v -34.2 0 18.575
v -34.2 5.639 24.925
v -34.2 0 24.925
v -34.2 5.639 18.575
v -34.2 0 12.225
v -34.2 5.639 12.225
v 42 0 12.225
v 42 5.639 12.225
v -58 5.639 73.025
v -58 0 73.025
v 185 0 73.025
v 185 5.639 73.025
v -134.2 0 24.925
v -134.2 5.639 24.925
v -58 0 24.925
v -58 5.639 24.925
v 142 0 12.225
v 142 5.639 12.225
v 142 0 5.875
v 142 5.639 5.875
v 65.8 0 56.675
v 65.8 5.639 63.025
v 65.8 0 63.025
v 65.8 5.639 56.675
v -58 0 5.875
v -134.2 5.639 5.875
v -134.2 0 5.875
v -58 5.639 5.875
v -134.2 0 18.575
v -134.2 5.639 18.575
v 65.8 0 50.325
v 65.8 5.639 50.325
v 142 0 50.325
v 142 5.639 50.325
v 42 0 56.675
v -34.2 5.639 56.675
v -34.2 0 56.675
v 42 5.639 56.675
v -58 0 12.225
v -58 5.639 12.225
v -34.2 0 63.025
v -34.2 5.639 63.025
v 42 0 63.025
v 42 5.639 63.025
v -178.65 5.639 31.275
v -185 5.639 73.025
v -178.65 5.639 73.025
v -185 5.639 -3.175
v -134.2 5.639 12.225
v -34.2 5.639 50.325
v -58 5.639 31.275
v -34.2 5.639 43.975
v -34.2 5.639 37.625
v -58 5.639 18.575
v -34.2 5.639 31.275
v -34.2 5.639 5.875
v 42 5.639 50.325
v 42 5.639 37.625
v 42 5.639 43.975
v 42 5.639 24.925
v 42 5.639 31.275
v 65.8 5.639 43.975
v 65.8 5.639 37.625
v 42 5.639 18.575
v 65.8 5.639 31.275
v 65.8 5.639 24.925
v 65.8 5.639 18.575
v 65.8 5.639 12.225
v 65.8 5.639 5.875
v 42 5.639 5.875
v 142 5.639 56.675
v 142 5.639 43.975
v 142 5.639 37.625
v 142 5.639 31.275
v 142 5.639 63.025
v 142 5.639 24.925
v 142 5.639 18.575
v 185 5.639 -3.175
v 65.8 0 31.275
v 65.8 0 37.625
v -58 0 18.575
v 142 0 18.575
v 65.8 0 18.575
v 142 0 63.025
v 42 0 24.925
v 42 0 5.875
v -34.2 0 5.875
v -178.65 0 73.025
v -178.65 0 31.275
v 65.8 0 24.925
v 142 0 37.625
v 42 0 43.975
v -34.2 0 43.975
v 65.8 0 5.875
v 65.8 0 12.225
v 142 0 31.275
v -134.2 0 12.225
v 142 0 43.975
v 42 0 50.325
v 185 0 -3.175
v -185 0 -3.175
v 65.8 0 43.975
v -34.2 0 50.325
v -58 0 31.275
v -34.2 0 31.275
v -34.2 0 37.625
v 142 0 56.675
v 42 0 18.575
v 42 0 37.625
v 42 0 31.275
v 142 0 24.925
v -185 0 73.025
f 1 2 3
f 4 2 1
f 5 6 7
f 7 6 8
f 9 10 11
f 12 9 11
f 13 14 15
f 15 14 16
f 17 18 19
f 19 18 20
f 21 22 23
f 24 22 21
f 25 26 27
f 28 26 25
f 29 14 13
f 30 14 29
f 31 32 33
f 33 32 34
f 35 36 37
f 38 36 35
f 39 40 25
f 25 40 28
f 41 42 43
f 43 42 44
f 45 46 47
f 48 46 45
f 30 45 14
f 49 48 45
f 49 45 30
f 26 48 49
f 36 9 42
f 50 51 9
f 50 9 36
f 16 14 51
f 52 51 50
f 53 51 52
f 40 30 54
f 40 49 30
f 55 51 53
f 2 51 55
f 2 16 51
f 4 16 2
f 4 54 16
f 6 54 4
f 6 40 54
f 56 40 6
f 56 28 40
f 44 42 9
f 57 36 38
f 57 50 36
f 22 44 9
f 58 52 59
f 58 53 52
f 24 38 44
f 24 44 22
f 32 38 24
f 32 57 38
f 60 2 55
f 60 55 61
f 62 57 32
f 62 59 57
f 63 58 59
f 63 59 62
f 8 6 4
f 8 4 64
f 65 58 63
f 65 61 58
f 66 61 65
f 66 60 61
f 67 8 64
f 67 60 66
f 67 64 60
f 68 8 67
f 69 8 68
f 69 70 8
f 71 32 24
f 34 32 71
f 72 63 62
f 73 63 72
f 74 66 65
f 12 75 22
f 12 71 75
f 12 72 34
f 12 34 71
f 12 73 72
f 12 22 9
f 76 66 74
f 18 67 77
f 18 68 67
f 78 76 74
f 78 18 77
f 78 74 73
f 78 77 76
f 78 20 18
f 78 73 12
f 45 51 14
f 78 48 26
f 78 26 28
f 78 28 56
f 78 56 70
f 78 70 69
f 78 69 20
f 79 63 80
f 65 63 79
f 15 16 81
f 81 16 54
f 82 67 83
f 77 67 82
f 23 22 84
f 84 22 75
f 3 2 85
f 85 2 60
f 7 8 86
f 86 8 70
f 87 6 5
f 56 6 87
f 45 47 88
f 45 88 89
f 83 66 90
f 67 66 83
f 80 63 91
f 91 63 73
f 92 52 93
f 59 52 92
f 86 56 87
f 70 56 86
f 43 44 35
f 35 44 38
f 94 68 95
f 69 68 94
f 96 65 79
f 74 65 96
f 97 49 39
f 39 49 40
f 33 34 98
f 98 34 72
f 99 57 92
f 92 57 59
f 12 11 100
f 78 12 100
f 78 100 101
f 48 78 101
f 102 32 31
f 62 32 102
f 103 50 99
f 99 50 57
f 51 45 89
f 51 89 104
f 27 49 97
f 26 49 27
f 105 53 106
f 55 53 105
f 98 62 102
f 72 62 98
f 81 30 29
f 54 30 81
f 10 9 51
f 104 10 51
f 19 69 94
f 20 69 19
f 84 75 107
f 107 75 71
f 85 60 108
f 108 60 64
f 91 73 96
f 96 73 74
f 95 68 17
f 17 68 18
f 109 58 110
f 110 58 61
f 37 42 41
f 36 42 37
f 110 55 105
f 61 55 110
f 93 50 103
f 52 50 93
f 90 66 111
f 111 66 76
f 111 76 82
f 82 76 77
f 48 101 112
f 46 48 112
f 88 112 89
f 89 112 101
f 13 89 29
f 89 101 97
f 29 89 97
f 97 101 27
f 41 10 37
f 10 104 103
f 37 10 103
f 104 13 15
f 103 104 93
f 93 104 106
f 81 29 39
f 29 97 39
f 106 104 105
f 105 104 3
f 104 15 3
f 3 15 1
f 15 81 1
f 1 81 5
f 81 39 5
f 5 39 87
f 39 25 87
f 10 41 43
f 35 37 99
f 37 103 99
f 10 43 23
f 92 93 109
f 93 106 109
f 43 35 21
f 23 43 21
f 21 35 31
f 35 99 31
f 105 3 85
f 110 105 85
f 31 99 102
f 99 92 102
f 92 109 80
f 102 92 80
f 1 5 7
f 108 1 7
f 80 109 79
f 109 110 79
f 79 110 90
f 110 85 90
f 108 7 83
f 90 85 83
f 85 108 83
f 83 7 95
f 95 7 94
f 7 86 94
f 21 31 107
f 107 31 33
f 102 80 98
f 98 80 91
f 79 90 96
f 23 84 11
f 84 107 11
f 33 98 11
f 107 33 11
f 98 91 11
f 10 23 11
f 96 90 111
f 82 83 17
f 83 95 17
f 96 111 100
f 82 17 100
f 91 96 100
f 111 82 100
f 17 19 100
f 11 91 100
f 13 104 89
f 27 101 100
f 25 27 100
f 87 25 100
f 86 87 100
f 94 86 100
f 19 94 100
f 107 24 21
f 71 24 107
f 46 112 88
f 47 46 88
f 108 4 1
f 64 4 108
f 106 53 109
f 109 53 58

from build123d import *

# Parameters (mm, degrees)
BOSS_EXTRUDE1_DEPTH  = 5.6388
SKETCH2_W            = 76.2
SKETCH2_H            = 6.35
CUT_EXTRUDE1_DEPTH   = 6.6388
LPATTERN1_COUNT      = 5
LPATTERN1_PITCH      = 12.7
LPATTERN1_COUNT_DIR2 = 3
LPATTERN1_PITCH_DIR2 = 100
SKETCH3_W            = 120.65
SKETCH3_H            = 41.75
CUT_EXTRUDE2_DEPTH   = 6.6388


with BuildPart() as part:
    # Sketch1 → Boss-Extrude1 (new body)
    with BuildSketch(Plane(origin=(0, 0, 0), x_dir=(1, 0, 0), z_dir=(0, 1, 0))):
        Polygon((-185, -73.025), (185, -73.025), (185, -6.825), (185, 3.175), (175, 3.175), (-175, 3.175), (-185, 3.175), (-185, -6.825), align=None)
    extrude(amount=BOSS_EXTRUDE1_DEPTH)

    # Sketch2 → Cut-Extrude1 (cut, through all)
    with BuildSketch(Plane(origin=(0, 5.6388, 0), x_dir=(1, 0, 0), z_dir=(0, 1, 0))):
        with Locations((-96.1, -59.85)):
            Rectangle(SKETCH2_W, SKETCH2_H)
    cut_extrude1 = extrude(amount=-CUT_EXTRUDE1_DEPTH, mode=Mode.SUBTRACT)

    # LPattern1: Cut-Extrude1 5 × 3
    with Locations(*[(j * LPATTERN1_PITCH_DIR2, 0, -i * LPATTERN1_PITCH) for i in range(LPATTERN1_COUNT) for j in range(LPATTERN1_COUNT_DIR2) if (i, j) != (0, 0)]):
        add(cut_extrude1, mode=Mode.SUBTRACT)

    # Sketch3 → Cut-Extrude2 (cut, through all)
    with BuildSketch(Plane(origin=(0, 5.6388, 0), x_dir=(1, 0, 0), z_dir=(0, 1, 0))):
        with Locations((-118.325, -52.15)):
            Rectangle(SKETCH3_W, SKETCH3_H)
    extrude(amount=-CUT_EXTRUDE2_DEPTH, mode=Mode.SUBTRACT)


solid = part.part
